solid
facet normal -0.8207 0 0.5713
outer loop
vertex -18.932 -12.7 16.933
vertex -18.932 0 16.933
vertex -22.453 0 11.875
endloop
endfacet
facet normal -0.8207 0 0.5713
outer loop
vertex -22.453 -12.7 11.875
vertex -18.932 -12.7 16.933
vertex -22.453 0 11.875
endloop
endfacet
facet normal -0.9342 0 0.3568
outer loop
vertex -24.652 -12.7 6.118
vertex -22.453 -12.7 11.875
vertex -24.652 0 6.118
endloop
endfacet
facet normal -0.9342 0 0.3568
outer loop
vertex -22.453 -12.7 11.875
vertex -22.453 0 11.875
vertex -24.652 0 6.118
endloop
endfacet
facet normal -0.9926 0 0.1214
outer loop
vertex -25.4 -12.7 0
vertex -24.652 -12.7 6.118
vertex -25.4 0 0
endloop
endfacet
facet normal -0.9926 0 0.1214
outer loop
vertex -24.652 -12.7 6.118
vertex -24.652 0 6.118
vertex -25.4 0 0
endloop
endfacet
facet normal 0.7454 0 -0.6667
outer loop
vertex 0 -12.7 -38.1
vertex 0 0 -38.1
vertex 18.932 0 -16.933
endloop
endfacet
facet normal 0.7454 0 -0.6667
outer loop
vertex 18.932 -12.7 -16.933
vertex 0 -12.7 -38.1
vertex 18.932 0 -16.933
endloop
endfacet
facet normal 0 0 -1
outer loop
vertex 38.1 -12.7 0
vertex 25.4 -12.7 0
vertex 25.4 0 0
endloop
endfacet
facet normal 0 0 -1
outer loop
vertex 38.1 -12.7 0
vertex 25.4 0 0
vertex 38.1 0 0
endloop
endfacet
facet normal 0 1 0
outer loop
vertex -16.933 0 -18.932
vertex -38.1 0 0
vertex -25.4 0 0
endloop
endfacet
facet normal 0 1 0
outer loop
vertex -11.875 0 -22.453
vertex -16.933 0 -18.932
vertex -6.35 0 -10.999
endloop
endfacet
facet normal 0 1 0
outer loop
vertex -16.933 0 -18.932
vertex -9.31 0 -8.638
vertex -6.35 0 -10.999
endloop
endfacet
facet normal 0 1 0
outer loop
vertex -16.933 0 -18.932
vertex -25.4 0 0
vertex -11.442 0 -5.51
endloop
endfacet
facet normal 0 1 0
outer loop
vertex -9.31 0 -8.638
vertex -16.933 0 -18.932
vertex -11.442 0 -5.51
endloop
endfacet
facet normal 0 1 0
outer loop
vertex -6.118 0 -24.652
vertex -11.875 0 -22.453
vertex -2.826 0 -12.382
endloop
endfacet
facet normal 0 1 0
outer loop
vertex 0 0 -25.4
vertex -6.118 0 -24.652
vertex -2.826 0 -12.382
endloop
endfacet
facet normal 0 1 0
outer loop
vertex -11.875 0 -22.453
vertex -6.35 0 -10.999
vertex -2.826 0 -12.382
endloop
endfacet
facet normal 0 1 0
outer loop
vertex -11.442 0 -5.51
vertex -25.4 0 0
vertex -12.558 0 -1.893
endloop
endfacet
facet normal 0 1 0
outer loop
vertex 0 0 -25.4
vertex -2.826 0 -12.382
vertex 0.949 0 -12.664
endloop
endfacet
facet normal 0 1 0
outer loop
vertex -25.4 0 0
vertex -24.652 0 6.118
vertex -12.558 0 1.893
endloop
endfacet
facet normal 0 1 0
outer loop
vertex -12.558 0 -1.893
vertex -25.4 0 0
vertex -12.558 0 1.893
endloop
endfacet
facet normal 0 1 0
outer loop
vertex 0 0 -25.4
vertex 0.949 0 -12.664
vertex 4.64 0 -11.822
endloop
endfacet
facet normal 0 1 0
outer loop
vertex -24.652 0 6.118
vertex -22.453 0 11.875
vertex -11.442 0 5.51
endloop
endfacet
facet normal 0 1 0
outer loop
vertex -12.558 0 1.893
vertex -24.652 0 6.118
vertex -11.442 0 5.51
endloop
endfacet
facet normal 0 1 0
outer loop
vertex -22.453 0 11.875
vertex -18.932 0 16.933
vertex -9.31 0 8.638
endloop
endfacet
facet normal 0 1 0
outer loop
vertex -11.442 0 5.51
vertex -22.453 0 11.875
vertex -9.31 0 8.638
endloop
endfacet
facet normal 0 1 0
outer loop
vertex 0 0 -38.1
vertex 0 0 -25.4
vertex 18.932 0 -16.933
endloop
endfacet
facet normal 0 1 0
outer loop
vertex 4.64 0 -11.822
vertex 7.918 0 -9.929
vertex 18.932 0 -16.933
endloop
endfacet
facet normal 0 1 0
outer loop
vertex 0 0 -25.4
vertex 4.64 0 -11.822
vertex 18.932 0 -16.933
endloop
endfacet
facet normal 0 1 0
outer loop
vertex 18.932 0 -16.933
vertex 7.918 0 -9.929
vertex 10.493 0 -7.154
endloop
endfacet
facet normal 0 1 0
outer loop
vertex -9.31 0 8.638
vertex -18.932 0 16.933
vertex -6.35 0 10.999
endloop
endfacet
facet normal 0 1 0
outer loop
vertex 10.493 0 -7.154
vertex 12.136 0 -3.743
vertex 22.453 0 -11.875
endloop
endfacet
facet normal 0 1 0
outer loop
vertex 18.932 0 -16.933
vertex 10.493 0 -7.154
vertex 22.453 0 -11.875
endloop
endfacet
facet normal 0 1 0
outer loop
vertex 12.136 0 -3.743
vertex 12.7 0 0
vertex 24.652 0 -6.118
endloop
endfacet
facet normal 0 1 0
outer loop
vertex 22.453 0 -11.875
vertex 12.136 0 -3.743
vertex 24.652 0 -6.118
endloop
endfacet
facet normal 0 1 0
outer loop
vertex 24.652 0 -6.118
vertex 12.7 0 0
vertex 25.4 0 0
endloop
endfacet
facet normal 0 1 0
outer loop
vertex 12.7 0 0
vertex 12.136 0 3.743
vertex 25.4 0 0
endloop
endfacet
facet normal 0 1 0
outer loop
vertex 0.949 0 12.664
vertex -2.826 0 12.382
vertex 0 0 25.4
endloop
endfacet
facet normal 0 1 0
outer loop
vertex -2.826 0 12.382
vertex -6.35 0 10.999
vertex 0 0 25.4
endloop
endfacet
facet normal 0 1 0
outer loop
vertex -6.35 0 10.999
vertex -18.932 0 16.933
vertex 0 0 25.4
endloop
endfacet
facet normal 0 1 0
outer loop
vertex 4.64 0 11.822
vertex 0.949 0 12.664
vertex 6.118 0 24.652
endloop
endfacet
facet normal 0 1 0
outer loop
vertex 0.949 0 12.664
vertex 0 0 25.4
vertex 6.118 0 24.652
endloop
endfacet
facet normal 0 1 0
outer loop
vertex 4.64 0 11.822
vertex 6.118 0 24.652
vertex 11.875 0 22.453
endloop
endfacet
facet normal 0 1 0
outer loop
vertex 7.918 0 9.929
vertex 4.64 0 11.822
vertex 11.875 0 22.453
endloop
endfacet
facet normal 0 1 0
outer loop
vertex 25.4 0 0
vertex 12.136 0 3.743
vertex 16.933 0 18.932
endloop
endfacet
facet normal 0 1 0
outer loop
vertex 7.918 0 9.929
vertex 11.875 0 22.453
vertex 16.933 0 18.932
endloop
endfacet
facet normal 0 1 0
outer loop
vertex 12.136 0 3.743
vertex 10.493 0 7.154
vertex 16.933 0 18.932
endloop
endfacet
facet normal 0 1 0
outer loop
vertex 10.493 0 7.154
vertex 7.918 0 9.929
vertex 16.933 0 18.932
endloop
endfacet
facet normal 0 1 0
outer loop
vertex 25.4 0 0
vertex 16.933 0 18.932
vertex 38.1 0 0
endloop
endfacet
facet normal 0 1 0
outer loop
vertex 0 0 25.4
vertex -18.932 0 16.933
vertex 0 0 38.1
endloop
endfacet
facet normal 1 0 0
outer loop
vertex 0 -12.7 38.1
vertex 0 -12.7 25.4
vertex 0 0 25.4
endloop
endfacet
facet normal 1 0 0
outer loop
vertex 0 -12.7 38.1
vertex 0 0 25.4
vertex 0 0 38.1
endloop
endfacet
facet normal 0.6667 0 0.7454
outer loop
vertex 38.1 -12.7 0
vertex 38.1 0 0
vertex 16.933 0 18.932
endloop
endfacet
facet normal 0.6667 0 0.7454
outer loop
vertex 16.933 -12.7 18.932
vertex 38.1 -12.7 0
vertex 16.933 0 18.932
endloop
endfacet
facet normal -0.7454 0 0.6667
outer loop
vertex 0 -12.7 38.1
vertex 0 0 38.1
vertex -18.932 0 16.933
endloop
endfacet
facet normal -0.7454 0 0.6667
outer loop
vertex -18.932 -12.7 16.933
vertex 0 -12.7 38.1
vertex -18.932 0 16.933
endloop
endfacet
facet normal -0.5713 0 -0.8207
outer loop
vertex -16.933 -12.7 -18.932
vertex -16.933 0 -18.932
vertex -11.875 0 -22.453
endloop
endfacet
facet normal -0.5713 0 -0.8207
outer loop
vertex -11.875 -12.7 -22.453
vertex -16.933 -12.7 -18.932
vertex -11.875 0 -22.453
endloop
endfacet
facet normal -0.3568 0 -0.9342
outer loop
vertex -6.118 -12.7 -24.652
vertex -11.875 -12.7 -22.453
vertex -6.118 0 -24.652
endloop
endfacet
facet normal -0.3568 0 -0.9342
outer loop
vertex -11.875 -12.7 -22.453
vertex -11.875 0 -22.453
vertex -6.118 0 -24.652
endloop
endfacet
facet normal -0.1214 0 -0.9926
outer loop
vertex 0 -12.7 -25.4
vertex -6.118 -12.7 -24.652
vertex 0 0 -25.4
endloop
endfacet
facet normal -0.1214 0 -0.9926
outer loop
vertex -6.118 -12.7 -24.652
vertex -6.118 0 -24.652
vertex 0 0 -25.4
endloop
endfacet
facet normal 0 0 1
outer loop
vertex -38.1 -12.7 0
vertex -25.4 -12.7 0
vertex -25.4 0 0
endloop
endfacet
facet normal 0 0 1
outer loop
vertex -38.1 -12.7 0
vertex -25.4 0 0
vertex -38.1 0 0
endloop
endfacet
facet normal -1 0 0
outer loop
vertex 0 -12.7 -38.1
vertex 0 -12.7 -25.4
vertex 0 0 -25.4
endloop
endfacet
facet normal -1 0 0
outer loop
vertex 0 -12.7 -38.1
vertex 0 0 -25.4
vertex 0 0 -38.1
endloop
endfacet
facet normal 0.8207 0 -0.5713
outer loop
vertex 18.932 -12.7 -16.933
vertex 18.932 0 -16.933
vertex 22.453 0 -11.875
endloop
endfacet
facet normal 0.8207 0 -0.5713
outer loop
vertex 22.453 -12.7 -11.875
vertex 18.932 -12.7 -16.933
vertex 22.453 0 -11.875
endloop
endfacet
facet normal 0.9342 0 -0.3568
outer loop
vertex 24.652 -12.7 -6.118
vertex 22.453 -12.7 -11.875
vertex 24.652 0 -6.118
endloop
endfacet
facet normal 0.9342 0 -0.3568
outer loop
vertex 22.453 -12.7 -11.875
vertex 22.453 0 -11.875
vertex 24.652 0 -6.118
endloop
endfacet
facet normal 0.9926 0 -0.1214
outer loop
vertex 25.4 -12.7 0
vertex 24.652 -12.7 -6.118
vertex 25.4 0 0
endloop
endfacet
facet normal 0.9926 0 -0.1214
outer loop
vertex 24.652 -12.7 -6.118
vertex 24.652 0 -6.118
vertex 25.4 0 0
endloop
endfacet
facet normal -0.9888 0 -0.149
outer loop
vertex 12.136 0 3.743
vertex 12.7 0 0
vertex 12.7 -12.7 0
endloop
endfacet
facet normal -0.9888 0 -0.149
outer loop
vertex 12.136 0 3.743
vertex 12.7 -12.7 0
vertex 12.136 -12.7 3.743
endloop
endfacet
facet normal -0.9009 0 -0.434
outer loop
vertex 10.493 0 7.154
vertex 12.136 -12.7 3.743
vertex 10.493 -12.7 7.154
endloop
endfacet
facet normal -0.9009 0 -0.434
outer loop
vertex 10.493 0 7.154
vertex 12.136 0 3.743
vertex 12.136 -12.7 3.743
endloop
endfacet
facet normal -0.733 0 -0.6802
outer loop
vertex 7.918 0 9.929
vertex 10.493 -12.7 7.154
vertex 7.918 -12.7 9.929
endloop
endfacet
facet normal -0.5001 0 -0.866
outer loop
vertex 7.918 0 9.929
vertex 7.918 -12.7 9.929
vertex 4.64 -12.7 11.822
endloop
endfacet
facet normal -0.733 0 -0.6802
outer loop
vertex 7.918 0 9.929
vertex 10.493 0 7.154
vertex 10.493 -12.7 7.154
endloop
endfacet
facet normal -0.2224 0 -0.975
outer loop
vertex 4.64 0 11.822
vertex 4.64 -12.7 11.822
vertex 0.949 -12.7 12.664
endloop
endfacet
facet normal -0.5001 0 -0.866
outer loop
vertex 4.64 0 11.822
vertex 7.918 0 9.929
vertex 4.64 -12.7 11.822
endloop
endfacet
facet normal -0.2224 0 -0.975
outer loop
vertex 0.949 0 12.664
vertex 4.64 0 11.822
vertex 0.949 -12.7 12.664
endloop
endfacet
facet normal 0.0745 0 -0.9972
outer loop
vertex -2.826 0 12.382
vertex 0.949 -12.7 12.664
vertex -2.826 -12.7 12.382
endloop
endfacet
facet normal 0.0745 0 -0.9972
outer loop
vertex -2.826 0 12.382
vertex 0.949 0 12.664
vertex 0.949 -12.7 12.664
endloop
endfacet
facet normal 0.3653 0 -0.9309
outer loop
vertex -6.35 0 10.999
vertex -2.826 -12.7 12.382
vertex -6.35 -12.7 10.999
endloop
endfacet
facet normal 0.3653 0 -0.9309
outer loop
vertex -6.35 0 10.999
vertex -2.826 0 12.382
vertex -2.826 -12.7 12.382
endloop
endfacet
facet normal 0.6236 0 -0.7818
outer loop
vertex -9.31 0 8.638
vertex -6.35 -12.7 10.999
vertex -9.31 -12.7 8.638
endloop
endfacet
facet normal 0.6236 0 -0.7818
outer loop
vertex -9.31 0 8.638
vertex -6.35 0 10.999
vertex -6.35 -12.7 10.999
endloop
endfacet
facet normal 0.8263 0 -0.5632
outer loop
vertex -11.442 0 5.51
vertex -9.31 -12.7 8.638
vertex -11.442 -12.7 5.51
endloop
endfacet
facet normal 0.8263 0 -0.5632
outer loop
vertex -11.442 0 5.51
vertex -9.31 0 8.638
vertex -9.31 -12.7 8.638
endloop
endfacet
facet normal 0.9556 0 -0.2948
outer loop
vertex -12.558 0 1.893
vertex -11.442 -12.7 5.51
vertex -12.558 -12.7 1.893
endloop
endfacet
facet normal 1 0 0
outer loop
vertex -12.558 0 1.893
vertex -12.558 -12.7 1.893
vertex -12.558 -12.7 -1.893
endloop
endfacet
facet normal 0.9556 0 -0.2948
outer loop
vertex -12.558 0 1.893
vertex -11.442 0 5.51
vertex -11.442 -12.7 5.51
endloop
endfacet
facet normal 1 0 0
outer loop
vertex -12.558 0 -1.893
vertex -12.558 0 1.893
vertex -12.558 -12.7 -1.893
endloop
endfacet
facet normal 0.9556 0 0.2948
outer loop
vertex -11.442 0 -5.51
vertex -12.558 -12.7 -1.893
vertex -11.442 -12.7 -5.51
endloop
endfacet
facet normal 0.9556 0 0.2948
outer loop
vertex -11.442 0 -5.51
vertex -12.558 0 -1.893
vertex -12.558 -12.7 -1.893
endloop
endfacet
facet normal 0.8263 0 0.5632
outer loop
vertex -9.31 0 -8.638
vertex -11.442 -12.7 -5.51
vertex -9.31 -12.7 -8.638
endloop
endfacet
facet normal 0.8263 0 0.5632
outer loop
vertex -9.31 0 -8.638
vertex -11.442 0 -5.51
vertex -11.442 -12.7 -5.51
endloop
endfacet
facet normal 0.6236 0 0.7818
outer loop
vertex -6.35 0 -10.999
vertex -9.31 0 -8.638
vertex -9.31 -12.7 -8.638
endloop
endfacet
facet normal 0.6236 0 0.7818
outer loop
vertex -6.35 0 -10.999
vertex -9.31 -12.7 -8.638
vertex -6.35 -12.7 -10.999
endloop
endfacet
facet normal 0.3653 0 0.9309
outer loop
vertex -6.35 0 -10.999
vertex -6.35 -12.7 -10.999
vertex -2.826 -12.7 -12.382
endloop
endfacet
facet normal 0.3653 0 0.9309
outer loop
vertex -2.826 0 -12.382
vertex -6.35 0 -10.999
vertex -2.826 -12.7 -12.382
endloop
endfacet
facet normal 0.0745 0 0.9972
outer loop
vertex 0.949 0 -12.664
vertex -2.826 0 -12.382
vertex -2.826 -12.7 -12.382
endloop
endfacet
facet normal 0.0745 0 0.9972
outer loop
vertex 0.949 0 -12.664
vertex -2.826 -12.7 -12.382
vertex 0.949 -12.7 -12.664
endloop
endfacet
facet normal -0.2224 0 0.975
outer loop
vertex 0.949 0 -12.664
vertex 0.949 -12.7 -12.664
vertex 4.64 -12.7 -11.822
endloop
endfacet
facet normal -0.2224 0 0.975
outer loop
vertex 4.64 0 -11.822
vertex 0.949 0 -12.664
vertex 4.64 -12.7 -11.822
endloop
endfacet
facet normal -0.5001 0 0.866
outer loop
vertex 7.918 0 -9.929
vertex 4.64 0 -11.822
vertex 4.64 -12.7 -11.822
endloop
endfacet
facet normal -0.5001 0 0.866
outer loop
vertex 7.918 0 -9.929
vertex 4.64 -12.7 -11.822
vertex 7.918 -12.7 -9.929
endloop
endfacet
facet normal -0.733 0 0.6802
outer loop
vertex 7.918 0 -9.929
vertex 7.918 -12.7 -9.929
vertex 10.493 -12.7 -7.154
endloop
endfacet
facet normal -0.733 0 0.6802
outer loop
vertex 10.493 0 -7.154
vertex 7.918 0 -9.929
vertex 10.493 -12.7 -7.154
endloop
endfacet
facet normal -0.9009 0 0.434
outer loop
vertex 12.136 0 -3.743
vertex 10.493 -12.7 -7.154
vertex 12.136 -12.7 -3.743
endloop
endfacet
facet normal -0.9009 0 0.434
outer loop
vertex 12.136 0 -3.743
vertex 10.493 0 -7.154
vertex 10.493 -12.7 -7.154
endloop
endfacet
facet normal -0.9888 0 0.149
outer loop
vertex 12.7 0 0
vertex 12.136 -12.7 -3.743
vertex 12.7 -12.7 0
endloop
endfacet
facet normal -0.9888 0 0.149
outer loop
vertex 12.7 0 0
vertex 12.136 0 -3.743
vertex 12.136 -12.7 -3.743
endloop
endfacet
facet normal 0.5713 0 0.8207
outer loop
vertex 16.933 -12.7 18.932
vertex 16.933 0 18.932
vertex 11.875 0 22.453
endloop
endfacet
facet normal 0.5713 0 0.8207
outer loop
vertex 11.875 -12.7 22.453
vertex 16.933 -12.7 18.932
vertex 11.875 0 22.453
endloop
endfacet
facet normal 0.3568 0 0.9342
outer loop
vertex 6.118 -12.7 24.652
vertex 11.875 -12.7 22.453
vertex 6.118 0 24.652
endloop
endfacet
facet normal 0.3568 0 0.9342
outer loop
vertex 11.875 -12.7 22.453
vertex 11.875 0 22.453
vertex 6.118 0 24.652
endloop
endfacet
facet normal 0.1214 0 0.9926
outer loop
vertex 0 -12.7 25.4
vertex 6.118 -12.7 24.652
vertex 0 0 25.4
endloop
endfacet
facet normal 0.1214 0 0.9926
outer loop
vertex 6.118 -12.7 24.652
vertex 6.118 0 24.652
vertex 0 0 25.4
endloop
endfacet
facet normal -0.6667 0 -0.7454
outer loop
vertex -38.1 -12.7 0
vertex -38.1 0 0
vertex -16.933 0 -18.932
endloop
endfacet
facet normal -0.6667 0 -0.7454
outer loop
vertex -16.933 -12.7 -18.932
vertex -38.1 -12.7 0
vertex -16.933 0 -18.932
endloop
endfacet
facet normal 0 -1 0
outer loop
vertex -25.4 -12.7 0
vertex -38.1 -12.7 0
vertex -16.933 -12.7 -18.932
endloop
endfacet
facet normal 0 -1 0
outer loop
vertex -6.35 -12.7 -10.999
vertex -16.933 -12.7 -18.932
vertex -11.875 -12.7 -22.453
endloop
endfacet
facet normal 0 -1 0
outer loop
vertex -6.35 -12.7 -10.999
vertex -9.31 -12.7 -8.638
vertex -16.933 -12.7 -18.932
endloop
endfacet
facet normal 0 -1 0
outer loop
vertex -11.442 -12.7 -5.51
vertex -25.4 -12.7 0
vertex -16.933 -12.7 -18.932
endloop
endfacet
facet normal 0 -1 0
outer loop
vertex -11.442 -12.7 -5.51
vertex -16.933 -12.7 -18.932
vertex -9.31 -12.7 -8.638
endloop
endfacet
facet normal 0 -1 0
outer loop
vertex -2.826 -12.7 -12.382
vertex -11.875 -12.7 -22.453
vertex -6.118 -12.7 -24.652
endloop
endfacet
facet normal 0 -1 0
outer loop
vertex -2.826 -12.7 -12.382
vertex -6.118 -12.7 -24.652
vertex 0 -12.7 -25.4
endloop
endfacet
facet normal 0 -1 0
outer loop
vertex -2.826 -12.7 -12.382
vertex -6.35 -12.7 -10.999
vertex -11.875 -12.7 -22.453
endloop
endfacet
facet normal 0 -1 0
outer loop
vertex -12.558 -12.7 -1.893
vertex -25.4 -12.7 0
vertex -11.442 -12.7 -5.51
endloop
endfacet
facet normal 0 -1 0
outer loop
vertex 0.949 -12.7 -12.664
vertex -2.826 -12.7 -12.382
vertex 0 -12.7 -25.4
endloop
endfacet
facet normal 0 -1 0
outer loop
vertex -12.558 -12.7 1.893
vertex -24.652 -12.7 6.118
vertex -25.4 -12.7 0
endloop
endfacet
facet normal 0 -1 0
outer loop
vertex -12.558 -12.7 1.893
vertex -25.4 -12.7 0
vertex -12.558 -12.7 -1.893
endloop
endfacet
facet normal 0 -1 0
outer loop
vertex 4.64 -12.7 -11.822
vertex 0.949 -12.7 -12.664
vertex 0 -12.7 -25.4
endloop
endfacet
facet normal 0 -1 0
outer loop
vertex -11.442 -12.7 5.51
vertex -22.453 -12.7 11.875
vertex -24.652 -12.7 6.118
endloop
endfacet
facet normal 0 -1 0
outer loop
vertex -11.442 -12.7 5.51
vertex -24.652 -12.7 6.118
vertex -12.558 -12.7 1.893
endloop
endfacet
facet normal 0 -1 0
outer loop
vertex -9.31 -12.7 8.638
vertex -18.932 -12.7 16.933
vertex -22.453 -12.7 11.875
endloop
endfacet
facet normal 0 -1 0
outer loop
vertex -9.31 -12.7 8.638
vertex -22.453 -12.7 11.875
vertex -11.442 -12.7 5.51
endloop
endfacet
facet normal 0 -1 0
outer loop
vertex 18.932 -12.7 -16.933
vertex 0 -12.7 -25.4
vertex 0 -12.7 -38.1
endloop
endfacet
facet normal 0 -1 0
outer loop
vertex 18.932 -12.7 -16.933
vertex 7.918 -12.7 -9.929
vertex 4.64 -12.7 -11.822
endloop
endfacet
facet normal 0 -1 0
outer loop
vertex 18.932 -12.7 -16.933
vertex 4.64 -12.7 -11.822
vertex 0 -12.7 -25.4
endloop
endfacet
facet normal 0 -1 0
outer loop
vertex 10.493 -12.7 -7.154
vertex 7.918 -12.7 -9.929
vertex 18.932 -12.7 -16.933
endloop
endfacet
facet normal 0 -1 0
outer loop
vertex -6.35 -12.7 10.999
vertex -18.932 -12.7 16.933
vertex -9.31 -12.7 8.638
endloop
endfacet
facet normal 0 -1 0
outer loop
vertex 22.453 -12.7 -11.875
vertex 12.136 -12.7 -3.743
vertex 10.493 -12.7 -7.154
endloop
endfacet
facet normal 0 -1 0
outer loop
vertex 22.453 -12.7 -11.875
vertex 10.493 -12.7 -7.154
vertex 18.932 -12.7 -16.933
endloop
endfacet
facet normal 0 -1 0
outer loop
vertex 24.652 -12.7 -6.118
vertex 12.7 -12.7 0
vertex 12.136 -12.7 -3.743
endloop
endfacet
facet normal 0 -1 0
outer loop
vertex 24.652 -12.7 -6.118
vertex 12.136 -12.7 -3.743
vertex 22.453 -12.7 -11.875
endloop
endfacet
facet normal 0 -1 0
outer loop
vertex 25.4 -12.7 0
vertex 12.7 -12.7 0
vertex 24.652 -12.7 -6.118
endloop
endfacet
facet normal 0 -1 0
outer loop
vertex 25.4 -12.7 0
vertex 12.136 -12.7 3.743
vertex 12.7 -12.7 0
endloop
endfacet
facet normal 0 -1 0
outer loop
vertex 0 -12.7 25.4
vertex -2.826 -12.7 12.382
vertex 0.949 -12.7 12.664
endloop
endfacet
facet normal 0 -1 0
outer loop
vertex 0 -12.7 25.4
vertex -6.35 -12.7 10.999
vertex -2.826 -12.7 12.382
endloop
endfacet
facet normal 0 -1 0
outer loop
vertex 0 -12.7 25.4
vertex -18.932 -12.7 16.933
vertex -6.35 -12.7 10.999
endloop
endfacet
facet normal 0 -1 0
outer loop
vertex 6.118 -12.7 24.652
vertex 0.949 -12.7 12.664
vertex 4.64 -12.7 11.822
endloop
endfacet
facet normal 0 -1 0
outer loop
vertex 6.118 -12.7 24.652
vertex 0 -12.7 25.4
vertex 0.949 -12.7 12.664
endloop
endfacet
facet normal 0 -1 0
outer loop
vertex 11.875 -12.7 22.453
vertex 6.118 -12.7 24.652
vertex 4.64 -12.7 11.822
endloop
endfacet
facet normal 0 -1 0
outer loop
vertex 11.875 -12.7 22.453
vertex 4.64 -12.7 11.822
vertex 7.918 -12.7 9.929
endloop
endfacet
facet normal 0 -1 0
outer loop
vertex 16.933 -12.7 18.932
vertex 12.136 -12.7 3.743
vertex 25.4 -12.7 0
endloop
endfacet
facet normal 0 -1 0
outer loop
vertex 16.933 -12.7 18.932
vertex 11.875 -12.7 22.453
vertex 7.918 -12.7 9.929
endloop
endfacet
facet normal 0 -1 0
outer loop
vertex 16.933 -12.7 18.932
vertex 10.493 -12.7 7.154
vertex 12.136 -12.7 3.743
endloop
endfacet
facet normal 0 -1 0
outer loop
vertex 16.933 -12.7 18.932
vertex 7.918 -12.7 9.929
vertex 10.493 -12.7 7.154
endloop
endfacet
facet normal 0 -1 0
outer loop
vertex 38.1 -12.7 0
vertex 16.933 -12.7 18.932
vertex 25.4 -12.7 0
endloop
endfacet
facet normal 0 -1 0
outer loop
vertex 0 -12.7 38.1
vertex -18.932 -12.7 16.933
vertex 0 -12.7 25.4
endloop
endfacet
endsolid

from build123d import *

# Parameters (mm, degrees)
F0_R     = 12.7
F1_DEPTH = 12.7


with BuildPart() as f1:
    # F0 (on Front) → F1 (new body)
    with BuildSketch(Plane.XZ):
        with BuildLine():
            ThreePointArc((18.932042, -16.933333), (23.727978, -9.063281), (25.4, 0))
            ThreePointArc((25.4, 0), (23.186922, 10.369507), (16.933333, 18.932042))
            ThreePointArc((16.933333, 18.932042), (9.063281, 23.727978), (0, 25.4))
            ThreePointArc((0, 25.4), (-10.369507, 23.186922), (-18.932042, 16.933333))
            ThreePointArc((-18.932042, 16.933333), (-23.727978, 9.063281), (-25.4, 0))
            ThreePointArc((-25.4, 0), (-23.186922, -10.369507), (-16.933333, -18.932042))
            ThreePointArc((-16.933333, -18.932042), (-9.063281, -23.727978), (0, -25.4))
            ThreePointArc((0, -25.4), (10.369507, -23.186922), (18.932042, -16.933333))
        make_face()
        Circle(F0_R, mode=Mode.SUBTRACT)
        with BuildLine():
            ThreePointArc((-18.932042, 16.933333), (-10.369507, 23.186922), (0, 25.4))
            Line((0, 25.4), (0, 38.1))
            Line((0, 38.1), (-18.932042, 16.933333))
        make_face()
        with BuildLine():
            ThreePointArc((16.933333, 18.932042), (23.186922, 10.369507), (25.4, 0))
            Line((25.4, 0), (38.1, 0))
            Line((38.1, 0), (16.933333, 18.932042))
        make_face()
        with BuildLine():
            Line((0, -38.1), (18.932042, -16.933333))
            ThreePointArc((18.932042, -16.933333), (10.369507, -23.186922), (0, -25.4))
            Line((0, -25.4), (0, -38.1))
        make_face()
        with BuildLine():
            Line((-38.1, 0), (-16.933333, -18.932042))
            ThreePointArc((-16.933333, -18.932042), (-23.186922, -10.369507), (-25.4, 0))
            Line((-25.4, 0), (-38.1, 0))
        make_face()
    extrude(amount=F1_DEPTH)


solid = f1.part
